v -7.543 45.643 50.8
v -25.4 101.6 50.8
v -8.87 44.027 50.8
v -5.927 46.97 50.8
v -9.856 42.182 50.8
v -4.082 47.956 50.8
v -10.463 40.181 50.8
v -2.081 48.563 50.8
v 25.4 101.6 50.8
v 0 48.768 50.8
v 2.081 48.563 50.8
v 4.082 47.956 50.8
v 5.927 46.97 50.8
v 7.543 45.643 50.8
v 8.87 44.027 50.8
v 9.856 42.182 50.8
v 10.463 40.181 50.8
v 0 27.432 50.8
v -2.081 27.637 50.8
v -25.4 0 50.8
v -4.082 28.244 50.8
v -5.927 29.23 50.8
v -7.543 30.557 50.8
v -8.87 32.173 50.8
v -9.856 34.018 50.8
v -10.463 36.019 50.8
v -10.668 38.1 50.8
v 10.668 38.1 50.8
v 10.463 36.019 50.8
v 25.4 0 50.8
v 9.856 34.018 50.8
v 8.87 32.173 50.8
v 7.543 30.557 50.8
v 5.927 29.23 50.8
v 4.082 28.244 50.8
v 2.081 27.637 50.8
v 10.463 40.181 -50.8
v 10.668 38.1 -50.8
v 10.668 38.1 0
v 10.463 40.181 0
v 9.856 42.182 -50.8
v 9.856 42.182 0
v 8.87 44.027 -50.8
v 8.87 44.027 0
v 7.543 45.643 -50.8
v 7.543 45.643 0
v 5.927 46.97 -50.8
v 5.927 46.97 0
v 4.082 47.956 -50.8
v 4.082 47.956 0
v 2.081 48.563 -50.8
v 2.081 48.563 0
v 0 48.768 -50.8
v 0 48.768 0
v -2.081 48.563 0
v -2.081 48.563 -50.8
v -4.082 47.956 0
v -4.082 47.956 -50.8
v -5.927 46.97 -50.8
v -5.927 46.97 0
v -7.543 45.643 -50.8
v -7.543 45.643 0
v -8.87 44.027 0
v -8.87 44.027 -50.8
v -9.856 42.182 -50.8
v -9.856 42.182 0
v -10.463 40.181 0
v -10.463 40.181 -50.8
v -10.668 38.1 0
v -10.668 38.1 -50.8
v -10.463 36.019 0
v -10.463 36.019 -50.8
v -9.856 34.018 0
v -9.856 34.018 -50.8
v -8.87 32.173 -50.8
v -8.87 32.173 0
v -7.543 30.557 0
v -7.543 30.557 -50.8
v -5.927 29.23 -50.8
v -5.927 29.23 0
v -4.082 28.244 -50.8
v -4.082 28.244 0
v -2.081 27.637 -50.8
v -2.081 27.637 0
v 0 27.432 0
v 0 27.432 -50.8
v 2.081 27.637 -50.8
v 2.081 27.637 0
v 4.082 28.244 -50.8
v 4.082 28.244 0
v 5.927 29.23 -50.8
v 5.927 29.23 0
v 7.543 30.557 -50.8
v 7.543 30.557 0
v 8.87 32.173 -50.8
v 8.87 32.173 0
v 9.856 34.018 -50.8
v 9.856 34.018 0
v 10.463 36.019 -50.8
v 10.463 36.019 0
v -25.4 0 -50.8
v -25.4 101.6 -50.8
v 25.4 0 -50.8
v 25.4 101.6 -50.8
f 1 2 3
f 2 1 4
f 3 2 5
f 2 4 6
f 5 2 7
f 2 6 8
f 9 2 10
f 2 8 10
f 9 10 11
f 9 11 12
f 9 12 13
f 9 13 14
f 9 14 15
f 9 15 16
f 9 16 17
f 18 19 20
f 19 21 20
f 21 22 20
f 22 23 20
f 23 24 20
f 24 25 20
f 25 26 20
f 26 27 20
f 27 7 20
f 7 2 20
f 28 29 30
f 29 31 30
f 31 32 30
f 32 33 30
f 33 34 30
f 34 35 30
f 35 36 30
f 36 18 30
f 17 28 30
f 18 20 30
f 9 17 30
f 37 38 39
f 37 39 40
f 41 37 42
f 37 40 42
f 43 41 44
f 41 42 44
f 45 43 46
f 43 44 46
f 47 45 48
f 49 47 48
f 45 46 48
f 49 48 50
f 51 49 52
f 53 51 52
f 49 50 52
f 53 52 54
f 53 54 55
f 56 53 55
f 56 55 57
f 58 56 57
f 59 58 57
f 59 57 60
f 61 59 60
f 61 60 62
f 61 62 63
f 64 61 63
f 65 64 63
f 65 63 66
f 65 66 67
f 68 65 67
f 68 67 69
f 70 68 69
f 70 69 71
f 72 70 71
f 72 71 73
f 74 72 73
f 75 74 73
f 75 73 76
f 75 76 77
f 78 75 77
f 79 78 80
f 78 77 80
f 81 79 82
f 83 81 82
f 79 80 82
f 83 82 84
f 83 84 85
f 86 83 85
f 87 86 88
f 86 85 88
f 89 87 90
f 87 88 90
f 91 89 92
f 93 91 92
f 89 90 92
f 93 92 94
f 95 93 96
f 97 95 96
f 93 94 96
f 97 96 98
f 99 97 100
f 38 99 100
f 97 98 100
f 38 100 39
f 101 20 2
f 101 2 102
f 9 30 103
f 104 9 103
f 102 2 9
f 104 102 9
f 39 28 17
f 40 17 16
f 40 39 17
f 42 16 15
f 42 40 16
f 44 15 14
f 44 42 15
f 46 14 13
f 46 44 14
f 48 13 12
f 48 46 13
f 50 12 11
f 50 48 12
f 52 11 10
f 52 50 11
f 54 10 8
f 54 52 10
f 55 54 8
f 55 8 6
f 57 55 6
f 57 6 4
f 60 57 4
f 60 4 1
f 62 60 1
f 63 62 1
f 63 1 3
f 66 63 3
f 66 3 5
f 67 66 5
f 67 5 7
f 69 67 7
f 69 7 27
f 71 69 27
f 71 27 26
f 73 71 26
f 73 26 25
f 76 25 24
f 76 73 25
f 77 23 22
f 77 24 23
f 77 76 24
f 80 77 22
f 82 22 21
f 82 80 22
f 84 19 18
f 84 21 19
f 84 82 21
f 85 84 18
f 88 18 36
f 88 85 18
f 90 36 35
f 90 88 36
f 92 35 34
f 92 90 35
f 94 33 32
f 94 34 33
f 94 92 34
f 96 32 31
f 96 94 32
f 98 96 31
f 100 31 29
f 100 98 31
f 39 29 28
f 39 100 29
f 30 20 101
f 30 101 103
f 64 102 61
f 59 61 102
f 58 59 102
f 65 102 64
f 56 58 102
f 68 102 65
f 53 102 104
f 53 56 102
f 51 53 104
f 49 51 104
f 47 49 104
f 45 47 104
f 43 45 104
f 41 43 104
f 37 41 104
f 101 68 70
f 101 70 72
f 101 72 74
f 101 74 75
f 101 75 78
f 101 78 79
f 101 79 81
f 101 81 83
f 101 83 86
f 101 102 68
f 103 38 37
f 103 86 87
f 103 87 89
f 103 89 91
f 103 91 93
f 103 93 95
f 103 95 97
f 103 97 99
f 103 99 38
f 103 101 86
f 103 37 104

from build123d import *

# Parameters (mm, degrees)
SKETCH1_W               = 50.8
SKETCH1_H               = 101.6
BOSS_EXTRUDE2_DEPTH     = 101.6
SKETCH4_R               = 10.668
CUT_EXTRUDE2_DEPTH      = 51.8
CUT_EXTRUDE2_DEPTH_BACK = 51.8


with BuildPart() as part:
    # Sketch1 → Boss-Extrude2 (new body)
    with BuildSketch(Plane(origin=(0, 0, 0), x_dir=(1, 0, 0), z_dir=(0, 1, 0))):
        Rectangle(SKETCH1_W, SKETCH1_H)
    extrude(amount=BOSS_EXTRUDE2_DEPTH)

    # Sketch4 → Cut-Extrude2 (cut, two sides)
    with BuildSketch(Plane.XY) as cut_extrude2_sk:
        with Locations((0, 38.1)):
            Circle(SKETCH4_R)
    extrude(amount=CUT_EXTRUDE2_DEPTH, mode=Mode.SUBTRACT)
    extrude(cut_extrude2_sk.sketch, amount=-CUT_EXTRUDE2_DEPTH_BACK, mode=Mode.SUBTRACT)


solid = part.part
